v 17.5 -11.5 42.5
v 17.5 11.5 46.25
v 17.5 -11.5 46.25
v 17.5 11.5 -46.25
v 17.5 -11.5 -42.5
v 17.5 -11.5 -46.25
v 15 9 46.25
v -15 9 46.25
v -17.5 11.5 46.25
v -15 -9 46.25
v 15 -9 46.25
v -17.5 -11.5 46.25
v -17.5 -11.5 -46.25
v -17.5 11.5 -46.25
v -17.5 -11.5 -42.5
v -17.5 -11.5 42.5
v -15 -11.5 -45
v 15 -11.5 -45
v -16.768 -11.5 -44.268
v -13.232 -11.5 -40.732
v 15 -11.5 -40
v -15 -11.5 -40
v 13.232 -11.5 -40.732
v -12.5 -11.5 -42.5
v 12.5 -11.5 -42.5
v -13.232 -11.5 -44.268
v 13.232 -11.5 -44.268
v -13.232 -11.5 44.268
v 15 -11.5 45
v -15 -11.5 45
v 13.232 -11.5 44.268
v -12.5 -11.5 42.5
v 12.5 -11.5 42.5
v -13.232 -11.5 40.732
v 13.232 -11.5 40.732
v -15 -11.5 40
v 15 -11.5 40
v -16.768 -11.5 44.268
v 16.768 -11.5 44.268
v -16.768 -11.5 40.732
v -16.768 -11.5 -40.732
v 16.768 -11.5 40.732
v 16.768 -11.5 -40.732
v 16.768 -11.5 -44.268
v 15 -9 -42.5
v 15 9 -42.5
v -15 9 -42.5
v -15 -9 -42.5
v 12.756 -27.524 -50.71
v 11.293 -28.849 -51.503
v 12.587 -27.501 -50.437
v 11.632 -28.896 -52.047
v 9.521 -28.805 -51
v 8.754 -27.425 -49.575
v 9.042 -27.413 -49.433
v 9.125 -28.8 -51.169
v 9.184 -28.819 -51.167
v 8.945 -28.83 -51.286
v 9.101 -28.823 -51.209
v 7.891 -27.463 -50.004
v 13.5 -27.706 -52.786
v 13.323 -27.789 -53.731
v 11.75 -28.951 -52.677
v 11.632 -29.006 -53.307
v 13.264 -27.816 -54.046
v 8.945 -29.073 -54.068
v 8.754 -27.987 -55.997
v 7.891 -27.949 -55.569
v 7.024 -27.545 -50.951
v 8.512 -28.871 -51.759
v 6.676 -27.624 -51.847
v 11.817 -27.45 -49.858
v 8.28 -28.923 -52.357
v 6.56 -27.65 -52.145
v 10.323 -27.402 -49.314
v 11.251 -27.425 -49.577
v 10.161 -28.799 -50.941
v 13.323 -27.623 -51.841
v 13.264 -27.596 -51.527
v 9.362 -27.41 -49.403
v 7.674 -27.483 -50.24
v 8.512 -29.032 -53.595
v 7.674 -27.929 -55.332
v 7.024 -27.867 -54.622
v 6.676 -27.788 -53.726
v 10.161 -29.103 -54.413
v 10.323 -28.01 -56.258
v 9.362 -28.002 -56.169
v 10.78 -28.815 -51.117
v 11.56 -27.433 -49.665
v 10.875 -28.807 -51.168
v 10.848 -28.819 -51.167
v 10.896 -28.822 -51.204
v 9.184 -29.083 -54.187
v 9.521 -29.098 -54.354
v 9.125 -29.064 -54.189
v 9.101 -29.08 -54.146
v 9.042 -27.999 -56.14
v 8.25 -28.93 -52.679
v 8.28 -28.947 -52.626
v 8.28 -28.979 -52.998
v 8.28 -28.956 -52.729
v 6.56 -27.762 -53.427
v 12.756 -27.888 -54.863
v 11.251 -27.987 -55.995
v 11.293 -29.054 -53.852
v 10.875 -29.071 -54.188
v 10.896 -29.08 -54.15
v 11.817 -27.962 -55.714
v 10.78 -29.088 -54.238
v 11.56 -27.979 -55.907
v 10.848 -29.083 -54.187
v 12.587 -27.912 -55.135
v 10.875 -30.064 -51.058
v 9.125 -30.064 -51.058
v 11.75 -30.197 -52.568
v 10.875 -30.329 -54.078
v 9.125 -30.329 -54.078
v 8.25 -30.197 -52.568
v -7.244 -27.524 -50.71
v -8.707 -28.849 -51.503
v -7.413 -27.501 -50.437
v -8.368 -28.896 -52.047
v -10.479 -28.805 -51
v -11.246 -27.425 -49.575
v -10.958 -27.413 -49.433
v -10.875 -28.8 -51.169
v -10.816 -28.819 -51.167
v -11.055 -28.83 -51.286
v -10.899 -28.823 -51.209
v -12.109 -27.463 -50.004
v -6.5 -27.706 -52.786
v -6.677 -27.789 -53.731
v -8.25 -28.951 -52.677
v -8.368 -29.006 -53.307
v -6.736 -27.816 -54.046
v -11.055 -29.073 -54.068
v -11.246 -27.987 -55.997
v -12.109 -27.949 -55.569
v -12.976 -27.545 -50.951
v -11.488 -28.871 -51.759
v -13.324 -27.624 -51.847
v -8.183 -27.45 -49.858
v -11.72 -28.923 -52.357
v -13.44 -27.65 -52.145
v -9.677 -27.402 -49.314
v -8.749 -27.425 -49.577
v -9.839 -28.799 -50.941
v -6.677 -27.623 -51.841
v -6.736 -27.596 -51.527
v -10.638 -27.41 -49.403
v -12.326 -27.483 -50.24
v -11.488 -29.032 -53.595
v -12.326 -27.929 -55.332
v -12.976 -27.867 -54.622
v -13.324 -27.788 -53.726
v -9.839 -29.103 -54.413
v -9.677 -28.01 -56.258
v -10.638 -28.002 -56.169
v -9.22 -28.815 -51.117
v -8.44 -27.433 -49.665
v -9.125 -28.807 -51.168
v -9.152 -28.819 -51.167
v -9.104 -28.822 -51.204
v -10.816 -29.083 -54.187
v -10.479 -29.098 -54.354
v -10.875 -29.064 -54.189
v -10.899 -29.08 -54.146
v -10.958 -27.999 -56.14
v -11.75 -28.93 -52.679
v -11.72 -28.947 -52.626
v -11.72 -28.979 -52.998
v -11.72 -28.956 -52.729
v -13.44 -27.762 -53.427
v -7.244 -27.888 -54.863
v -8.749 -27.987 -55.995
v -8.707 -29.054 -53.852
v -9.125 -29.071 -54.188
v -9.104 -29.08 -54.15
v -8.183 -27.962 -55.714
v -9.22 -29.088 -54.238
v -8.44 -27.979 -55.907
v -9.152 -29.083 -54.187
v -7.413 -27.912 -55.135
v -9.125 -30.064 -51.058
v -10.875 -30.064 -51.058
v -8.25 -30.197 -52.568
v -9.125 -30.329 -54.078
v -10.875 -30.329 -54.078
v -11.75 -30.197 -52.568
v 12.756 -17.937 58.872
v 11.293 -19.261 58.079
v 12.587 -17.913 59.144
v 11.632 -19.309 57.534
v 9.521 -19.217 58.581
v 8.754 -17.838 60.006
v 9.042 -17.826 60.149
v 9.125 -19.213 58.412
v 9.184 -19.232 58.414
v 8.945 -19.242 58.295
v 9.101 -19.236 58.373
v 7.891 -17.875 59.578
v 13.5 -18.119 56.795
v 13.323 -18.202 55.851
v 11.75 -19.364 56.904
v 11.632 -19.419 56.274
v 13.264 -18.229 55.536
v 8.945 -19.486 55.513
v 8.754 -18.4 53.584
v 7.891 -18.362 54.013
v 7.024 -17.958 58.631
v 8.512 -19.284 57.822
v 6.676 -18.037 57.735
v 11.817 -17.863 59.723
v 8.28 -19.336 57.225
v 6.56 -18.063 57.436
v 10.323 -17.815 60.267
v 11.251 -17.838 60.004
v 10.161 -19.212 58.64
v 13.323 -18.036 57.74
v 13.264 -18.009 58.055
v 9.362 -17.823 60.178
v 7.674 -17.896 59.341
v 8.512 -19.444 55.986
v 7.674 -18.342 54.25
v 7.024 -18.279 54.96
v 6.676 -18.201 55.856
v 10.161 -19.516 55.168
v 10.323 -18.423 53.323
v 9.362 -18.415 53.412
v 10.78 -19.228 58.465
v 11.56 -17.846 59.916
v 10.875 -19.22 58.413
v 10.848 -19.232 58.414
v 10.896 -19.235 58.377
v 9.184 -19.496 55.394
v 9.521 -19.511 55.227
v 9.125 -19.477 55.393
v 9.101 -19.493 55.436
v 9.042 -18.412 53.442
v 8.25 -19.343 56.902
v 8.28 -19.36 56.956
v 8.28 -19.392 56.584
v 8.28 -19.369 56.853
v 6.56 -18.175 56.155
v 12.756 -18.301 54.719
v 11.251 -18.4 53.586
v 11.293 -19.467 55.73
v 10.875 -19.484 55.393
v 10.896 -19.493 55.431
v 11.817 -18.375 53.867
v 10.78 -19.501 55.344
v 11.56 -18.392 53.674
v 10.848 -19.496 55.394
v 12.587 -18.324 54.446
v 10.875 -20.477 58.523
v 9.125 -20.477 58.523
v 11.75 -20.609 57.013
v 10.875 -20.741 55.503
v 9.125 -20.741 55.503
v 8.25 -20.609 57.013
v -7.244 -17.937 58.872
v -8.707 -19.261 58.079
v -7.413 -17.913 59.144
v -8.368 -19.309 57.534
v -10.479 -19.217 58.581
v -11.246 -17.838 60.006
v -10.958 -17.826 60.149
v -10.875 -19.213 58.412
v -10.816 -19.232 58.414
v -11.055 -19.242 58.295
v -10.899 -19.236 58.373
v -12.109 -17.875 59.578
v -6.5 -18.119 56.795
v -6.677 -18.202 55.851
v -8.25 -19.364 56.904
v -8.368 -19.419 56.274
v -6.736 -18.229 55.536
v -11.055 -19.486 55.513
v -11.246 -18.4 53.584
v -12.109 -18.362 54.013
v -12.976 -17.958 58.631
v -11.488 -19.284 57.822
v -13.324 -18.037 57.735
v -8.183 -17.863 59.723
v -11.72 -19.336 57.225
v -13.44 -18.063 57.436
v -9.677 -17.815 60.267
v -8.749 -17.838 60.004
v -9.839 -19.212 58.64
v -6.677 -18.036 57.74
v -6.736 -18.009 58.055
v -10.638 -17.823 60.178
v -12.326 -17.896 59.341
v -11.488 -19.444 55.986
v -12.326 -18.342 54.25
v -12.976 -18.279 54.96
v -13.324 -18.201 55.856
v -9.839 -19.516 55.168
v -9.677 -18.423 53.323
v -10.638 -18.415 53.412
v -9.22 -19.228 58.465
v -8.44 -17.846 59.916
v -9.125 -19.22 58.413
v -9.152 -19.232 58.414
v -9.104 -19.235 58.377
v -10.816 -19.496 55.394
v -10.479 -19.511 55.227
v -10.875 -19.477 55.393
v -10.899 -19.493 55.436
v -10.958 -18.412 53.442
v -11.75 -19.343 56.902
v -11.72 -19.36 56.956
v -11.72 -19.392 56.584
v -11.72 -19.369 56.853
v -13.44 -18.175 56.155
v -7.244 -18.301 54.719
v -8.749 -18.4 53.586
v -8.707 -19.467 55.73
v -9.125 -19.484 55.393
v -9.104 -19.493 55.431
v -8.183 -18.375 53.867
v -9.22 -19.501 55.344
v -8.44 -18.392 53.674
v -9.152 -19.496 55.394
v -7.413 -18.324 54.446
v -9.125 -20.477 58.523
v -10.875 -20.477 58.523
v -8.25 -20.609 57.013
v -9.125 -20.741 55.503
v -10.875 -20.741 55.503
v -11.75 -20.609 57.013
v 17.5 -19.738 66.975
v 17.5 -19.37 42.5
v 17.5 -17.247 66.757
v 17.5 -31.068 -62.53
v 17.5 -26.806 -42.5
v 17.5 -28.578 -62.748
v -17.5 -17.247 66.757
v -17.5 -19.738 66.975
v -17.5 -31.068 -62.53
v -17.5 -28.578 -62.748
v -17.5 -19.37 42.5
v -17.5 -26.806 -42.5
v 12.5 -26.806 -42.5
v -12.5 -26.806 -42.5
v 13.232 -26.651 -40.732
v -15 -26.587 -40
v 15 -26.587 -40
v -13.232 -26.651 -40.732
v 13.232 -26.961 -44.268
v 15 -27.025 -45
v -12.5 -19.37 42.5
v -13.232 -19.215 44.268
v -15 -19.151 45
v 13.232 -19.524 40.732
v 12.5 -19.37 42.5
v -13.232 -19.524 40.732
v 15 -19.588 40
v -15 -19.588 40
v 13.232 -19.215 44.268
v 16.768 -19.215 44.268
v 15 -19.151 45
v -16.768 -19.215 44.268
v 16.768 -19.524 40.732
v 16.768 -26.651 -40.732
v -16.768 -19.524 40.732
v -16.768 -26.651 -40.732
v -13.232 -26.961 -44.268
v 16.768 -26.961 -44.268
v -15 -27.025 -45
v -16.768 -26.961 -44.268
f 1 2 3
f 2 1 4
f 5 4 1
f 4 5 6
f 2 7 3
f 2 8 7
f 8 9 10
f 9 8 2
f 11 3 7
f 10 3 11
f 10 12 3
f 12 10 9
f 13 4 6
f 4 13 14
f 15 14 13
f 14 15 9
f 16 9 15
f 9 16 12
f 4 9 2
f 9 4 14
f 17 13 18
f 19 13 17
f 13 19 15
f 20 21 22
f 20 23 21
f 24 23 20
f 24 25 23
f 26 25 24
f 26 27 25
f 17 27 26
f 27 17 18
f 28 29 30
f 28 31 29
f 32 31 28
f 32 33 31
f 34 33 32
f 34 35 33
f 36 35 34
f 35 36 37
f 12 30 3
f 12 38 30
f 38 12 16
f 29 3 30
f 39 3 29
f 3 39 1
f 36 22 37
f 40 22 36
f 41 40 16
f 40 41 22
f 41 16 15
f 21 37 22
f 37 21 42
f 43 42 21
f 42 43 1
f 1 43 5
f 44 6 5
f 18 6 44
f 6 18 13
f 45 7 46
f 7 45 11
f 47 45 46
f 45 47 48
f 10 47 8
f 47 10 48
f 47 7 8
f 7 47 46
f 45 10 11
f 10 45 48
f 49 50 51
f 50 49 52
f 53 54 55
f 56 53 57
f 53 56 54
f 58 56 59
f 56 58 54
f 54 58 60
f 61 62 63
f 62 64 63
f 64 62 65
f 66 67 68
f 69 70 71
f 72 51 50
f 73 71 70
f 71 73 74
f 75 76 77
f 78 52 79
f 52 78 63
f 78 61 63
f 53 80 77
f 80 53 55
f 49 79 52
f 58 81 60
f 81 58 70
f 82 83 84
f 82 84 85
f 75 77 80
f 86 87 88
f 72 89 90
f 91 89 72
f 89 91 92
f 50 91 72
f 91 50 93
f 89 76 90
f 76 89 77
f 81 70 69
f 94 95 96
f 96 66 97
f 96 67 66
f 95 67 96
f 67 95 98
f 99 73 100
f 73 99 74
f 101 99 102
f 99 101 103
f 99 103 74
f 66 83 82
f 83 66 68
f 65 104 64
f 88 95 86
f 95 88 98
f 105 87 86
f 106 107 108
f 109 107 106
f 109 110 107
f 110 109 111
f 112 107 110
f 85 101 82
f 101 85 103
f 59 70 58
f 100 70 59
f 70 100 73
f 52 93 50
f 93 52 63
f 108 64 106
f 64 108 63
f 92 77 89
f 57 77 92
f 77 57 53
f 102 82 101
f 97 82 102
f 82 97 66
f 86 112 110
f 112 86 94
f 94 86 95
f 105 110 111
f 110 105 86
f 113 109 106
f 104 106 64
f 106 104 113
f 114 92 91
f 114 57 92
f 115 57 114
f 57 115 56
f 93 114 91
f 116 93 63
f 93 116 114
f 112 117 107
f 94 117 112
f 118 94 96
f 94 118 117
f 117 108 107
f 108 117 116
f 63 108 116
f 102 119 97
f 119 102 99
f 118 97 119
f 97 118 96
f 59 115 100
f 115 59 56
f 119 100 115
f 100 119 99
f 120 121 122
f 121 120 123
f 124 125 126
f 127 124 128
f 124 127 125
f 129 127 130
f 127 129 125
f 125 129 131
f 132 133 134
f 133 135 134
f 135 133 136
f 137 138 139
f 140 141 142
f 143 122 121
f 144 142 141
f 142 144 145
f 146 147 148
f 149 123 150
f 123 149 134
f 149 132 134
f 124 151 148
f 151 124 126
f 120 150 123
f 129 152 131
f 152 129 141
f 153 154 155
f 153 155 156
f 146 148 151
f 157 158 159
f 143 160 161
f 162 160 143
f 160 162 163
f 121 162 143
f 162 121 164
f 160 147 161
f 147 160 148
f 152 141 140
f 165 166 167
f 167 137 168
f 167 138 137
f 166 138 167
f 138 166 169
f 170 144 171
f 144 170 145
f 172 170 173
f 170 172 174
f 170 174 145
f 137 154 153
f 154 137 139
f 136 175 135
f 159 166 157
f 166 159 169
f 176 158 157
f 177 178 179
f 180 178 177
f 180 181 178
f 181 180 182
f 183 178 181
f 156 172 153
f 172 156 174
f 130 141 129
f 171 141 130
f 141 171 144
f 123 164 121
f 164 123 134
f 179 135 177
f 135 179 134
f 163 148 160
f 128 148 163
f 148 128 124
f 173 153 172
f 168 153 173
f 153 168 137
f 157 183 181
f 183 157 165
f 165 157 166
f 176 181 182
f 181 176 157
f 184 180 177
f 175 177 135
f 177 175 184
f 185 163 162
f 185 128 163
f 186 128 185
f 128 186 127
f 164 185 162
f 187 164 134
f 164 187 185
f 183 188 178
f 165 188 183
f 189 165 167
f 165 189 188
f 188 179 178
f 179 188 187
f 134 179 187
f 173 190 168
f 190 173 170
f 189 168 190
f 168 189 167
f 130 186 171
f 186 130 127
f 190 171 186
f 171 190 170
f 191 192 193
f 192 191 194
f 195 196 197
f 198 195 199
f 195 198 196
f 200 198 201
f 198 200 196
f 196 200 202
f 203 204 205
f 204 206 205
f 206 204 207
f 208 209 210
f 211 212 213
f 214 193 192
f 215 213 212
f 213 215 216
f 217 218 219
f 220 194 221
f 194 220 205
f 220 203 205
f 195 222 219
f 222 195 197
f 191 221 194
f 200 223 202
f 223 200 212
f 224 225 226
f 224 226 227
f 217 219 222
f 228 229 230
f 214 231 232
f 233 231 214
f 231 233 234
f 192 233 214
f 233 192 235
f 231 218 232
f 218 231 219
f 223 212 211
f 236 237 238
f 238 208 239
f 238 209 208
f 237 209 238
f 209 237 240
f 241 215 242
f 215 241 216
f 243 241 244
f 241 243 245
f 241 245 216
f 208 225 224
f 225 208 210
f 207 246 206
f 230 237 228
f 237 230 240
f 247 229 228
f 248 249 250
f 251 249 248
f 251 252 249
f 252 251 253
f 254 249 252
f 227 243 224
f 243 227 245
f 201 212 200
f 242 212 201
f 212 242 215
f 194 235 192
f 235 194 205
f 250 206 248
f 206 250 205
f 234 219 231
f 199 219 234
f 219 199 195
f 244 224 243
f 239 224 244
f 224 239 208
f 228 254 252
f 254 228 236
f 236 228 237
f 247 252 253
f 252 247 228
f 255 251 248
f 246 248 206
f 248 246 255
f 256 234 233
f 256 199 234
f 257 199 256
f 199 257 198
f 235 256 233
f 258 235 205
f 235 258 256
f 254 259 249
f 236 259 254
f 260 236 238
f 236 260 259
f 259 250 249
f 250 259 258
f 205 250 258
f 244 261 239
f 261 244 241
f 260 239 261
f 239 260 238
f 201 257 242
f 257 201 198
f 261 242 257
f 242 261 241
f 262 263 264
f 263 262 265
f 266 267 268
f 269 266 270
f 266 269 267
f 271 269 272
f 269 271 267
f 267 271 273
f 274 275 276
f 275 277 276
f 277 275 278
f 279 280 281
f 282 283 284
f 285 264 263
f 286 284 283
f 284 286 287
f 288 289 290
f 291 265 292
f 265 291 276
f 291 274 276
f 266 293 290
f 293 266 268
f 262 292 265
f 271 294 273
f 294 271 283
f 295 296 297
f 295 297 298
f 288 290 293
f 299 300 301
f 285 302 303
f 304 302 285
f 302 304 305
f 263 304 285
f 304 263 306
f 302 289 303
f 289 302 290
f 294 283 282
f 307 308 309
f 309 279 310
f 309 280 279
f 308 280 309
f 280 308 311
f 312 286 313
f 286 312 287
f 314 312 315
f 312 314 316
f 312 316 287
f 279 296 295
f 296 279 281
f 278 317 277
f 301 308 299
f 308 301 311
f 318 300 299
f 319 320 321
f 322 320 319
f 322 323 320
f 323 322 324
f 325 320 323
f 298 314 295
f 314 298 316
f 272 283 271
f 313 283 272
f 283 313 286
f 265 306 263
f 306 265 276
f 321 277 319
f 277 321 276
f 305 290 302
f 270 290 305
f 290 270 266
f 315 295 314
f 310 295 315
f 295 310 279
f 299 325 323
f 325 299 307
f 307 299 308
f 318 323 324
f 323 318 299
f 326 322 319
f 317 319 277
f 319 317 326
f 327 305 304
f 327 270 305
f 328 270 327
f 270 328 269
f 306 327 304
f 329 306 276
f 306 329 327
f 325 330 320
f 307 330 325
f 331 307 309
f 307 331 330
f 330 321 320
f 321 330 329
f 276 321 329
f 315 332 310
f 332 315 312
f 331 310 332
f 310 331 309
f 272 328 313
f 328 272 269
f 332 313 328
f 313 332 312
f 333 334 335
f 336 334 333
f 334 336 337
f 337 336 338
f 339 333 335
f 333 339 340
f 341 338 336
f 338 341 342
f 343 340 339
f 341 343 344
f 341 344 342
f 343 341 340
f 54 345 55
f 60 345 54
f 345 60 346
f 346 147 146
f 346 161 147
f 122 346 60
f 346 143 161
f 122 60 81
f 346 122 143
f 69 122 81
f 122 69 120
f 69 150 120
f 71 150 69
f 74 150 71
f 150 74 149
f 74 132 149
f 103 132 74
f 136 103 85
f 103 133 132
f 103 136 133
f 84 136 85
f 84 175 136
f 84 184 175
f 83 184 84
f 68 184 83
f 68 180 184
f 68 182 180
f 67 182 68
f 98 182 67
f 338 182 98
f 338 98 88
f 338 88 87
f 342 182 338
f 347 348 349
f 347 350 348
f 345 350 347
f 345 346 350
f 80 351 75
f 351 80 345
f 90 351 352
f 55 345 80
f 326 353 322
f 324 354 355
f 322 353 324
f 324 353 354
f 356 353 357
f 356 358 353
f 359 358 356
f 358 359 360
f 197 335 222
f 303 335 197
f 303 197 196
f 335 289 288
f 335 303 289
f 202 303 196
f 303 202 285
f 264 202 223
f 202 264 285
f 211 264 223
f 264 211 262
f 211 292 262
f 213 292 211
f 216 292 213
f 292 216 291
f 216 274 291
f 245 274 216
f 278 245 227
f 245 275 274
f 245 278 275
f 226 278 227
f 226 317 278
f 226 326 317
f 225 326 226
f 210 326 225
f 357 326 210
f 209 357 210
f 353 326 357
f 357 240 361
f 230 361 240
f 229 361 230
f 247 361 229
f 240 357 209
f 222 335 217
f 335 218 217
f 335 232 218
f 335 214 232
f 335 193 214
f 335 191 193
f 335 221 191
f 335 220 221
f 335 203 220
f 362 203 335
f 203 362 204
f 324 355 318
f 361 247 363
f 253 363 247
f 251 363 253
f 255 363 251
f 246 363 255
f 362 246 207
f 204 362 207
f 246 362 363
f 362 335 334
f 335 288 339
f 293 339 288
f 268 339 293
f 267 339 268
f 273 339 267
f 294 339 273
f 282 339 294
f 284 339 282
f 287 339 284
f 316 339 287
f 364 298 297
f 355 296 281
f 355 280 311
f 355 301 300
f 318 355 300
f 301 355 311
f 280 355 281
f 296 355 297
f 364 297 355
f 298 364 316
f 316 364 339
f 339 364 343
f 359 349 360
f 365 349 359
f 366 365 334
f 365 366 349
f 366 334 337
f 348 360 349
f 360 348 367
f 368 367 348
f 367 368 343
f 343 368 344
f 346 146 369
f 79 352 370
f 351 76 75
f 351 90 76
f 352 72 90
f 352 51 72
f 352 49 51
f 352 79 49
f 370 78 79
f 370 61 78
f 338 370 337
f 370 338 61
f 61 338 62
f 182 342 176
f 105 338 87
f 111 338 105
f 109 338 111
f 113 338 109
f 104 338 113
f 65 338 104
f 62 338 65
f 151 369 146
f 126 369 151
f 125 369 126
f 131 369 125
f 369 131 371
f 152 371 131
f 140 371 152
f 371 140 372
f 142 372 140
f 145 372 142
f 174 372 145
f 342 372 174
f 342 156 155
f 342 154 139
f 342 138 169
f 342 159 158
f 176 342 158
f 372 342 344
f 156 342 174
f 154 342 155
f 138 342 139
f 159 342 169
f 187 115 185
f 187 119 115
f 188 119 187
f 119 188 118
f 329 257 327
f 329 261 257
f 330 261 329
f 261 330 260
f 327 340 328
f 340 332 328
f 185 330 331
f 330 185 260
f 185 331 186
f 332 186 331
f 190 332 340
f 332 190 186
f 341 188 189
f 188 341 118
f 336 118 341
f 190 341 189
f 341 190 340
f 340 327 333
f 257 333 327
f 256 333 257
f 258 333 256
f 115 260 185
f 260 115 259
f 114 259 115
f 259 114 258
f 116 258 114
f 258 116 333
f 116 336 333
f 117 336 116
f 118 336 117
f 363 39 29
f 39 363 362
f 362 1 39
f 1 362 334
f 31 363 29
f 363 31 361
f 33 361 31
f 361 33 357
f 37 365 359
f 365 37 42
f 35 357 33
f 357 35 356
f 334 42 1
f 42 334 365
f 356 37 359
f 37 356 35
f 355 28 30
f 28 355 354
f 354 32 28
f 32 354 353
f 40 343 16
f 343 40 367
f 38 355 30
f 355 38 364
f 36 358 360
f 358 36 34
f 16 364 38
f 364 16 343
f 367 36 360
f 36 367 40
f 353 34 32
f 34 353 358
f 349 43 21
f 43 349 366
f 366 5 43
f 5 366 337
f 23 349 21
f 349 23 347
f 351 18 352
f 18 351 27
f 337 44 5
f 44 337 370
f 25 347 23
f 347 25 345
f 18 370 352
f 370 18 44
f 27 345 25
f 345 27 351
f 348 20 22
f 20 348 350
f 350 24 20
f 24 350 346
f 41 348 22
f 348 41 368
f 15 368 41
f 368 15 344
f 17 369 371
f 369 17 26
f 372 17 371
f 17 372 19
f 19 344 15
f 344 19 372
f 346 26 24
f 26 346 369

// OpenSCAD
width=30;
depth=18;
length=90;
caseThickness=2.5;
mountingLipLength=20;
screwDiameter=3.5;

module screwHole () {
    color("green",1.0) {
        translate([0,0,caseThickness/2])
            cylinder(h = caseThickness, d1 = screwDiameter, d2 = screwDiameter*3, center = true);
        translate([0,0,-caseThickness]){
            cylinder(h=(caseThickness*2), d=screwDiameter);
        };
    }
}

module box() {
    difference() {
        cube([width+2*caseThickness,depth+2*caseThickness,length+1*caseThickness], center = true);
        translate([0,0,caseThickness])
            cube([width,depth,length], center = true);
    }
}

module mountPlate() {
    difference() {
        color("blue", 1.0) {
            cube([width+2*caseThickness,caseThickness,length+2*mountingLipLength], center = true);
        }
        rotate([-90,0,0]) {
            translate([(width-10)/2,(length+mountingLipLength)/2,0])
                screwHole();
            translate([-(width-10)/2,(length+mountingLipLength)/2,0])
                screwHole();
            translate([(width-10)/2,-(length+mountingLipLength)/2,0])
                screwHole();
            translate([-(width-10)/2,-(length+mountingLipLength)/2,0])
                screwHole();
        }
    }
}

module mountSupports() {
    color("red", 1.0) {
        // Top left
        translate([width/2,-(depth/2+3*caseThickness),length/2-caseThickness])
            rotate([90,0,0])
                cylinder(h = 10, d = 5, center = true);
        // Top right
        translate([-width/2,-(depth/2+3*caseThickness),length/2-caseThickness])
            rotate([90,0,0])
                cylinder(h = 10, d = 5, center = true);
        // Bottom left
        translate([width/2,-(depth/2+2*caseThickness)-5,-(length/2-caseThickness)])
            rotate([90,0,0])
                cylinder(h = 19, d = 5, center = true);
        // Bottom right
        translate([-width/2,-(depth/2+2*caseThickness)-5,-(length/2-caseThickness)])
            rotate([90,0,0])
                cylinder(h = 19, d = 5, center = true);
    }
}

module UnderDeskAircoRemoteControlStorage() {
    union () {
        box();
        rotate([-5,0,0])
            translate([0,-(depth+2.5*caseThickness),0])
                mountPlate();
        mountSupports();
    }
}

UnderDeskAircoRemoteControlStorage();
